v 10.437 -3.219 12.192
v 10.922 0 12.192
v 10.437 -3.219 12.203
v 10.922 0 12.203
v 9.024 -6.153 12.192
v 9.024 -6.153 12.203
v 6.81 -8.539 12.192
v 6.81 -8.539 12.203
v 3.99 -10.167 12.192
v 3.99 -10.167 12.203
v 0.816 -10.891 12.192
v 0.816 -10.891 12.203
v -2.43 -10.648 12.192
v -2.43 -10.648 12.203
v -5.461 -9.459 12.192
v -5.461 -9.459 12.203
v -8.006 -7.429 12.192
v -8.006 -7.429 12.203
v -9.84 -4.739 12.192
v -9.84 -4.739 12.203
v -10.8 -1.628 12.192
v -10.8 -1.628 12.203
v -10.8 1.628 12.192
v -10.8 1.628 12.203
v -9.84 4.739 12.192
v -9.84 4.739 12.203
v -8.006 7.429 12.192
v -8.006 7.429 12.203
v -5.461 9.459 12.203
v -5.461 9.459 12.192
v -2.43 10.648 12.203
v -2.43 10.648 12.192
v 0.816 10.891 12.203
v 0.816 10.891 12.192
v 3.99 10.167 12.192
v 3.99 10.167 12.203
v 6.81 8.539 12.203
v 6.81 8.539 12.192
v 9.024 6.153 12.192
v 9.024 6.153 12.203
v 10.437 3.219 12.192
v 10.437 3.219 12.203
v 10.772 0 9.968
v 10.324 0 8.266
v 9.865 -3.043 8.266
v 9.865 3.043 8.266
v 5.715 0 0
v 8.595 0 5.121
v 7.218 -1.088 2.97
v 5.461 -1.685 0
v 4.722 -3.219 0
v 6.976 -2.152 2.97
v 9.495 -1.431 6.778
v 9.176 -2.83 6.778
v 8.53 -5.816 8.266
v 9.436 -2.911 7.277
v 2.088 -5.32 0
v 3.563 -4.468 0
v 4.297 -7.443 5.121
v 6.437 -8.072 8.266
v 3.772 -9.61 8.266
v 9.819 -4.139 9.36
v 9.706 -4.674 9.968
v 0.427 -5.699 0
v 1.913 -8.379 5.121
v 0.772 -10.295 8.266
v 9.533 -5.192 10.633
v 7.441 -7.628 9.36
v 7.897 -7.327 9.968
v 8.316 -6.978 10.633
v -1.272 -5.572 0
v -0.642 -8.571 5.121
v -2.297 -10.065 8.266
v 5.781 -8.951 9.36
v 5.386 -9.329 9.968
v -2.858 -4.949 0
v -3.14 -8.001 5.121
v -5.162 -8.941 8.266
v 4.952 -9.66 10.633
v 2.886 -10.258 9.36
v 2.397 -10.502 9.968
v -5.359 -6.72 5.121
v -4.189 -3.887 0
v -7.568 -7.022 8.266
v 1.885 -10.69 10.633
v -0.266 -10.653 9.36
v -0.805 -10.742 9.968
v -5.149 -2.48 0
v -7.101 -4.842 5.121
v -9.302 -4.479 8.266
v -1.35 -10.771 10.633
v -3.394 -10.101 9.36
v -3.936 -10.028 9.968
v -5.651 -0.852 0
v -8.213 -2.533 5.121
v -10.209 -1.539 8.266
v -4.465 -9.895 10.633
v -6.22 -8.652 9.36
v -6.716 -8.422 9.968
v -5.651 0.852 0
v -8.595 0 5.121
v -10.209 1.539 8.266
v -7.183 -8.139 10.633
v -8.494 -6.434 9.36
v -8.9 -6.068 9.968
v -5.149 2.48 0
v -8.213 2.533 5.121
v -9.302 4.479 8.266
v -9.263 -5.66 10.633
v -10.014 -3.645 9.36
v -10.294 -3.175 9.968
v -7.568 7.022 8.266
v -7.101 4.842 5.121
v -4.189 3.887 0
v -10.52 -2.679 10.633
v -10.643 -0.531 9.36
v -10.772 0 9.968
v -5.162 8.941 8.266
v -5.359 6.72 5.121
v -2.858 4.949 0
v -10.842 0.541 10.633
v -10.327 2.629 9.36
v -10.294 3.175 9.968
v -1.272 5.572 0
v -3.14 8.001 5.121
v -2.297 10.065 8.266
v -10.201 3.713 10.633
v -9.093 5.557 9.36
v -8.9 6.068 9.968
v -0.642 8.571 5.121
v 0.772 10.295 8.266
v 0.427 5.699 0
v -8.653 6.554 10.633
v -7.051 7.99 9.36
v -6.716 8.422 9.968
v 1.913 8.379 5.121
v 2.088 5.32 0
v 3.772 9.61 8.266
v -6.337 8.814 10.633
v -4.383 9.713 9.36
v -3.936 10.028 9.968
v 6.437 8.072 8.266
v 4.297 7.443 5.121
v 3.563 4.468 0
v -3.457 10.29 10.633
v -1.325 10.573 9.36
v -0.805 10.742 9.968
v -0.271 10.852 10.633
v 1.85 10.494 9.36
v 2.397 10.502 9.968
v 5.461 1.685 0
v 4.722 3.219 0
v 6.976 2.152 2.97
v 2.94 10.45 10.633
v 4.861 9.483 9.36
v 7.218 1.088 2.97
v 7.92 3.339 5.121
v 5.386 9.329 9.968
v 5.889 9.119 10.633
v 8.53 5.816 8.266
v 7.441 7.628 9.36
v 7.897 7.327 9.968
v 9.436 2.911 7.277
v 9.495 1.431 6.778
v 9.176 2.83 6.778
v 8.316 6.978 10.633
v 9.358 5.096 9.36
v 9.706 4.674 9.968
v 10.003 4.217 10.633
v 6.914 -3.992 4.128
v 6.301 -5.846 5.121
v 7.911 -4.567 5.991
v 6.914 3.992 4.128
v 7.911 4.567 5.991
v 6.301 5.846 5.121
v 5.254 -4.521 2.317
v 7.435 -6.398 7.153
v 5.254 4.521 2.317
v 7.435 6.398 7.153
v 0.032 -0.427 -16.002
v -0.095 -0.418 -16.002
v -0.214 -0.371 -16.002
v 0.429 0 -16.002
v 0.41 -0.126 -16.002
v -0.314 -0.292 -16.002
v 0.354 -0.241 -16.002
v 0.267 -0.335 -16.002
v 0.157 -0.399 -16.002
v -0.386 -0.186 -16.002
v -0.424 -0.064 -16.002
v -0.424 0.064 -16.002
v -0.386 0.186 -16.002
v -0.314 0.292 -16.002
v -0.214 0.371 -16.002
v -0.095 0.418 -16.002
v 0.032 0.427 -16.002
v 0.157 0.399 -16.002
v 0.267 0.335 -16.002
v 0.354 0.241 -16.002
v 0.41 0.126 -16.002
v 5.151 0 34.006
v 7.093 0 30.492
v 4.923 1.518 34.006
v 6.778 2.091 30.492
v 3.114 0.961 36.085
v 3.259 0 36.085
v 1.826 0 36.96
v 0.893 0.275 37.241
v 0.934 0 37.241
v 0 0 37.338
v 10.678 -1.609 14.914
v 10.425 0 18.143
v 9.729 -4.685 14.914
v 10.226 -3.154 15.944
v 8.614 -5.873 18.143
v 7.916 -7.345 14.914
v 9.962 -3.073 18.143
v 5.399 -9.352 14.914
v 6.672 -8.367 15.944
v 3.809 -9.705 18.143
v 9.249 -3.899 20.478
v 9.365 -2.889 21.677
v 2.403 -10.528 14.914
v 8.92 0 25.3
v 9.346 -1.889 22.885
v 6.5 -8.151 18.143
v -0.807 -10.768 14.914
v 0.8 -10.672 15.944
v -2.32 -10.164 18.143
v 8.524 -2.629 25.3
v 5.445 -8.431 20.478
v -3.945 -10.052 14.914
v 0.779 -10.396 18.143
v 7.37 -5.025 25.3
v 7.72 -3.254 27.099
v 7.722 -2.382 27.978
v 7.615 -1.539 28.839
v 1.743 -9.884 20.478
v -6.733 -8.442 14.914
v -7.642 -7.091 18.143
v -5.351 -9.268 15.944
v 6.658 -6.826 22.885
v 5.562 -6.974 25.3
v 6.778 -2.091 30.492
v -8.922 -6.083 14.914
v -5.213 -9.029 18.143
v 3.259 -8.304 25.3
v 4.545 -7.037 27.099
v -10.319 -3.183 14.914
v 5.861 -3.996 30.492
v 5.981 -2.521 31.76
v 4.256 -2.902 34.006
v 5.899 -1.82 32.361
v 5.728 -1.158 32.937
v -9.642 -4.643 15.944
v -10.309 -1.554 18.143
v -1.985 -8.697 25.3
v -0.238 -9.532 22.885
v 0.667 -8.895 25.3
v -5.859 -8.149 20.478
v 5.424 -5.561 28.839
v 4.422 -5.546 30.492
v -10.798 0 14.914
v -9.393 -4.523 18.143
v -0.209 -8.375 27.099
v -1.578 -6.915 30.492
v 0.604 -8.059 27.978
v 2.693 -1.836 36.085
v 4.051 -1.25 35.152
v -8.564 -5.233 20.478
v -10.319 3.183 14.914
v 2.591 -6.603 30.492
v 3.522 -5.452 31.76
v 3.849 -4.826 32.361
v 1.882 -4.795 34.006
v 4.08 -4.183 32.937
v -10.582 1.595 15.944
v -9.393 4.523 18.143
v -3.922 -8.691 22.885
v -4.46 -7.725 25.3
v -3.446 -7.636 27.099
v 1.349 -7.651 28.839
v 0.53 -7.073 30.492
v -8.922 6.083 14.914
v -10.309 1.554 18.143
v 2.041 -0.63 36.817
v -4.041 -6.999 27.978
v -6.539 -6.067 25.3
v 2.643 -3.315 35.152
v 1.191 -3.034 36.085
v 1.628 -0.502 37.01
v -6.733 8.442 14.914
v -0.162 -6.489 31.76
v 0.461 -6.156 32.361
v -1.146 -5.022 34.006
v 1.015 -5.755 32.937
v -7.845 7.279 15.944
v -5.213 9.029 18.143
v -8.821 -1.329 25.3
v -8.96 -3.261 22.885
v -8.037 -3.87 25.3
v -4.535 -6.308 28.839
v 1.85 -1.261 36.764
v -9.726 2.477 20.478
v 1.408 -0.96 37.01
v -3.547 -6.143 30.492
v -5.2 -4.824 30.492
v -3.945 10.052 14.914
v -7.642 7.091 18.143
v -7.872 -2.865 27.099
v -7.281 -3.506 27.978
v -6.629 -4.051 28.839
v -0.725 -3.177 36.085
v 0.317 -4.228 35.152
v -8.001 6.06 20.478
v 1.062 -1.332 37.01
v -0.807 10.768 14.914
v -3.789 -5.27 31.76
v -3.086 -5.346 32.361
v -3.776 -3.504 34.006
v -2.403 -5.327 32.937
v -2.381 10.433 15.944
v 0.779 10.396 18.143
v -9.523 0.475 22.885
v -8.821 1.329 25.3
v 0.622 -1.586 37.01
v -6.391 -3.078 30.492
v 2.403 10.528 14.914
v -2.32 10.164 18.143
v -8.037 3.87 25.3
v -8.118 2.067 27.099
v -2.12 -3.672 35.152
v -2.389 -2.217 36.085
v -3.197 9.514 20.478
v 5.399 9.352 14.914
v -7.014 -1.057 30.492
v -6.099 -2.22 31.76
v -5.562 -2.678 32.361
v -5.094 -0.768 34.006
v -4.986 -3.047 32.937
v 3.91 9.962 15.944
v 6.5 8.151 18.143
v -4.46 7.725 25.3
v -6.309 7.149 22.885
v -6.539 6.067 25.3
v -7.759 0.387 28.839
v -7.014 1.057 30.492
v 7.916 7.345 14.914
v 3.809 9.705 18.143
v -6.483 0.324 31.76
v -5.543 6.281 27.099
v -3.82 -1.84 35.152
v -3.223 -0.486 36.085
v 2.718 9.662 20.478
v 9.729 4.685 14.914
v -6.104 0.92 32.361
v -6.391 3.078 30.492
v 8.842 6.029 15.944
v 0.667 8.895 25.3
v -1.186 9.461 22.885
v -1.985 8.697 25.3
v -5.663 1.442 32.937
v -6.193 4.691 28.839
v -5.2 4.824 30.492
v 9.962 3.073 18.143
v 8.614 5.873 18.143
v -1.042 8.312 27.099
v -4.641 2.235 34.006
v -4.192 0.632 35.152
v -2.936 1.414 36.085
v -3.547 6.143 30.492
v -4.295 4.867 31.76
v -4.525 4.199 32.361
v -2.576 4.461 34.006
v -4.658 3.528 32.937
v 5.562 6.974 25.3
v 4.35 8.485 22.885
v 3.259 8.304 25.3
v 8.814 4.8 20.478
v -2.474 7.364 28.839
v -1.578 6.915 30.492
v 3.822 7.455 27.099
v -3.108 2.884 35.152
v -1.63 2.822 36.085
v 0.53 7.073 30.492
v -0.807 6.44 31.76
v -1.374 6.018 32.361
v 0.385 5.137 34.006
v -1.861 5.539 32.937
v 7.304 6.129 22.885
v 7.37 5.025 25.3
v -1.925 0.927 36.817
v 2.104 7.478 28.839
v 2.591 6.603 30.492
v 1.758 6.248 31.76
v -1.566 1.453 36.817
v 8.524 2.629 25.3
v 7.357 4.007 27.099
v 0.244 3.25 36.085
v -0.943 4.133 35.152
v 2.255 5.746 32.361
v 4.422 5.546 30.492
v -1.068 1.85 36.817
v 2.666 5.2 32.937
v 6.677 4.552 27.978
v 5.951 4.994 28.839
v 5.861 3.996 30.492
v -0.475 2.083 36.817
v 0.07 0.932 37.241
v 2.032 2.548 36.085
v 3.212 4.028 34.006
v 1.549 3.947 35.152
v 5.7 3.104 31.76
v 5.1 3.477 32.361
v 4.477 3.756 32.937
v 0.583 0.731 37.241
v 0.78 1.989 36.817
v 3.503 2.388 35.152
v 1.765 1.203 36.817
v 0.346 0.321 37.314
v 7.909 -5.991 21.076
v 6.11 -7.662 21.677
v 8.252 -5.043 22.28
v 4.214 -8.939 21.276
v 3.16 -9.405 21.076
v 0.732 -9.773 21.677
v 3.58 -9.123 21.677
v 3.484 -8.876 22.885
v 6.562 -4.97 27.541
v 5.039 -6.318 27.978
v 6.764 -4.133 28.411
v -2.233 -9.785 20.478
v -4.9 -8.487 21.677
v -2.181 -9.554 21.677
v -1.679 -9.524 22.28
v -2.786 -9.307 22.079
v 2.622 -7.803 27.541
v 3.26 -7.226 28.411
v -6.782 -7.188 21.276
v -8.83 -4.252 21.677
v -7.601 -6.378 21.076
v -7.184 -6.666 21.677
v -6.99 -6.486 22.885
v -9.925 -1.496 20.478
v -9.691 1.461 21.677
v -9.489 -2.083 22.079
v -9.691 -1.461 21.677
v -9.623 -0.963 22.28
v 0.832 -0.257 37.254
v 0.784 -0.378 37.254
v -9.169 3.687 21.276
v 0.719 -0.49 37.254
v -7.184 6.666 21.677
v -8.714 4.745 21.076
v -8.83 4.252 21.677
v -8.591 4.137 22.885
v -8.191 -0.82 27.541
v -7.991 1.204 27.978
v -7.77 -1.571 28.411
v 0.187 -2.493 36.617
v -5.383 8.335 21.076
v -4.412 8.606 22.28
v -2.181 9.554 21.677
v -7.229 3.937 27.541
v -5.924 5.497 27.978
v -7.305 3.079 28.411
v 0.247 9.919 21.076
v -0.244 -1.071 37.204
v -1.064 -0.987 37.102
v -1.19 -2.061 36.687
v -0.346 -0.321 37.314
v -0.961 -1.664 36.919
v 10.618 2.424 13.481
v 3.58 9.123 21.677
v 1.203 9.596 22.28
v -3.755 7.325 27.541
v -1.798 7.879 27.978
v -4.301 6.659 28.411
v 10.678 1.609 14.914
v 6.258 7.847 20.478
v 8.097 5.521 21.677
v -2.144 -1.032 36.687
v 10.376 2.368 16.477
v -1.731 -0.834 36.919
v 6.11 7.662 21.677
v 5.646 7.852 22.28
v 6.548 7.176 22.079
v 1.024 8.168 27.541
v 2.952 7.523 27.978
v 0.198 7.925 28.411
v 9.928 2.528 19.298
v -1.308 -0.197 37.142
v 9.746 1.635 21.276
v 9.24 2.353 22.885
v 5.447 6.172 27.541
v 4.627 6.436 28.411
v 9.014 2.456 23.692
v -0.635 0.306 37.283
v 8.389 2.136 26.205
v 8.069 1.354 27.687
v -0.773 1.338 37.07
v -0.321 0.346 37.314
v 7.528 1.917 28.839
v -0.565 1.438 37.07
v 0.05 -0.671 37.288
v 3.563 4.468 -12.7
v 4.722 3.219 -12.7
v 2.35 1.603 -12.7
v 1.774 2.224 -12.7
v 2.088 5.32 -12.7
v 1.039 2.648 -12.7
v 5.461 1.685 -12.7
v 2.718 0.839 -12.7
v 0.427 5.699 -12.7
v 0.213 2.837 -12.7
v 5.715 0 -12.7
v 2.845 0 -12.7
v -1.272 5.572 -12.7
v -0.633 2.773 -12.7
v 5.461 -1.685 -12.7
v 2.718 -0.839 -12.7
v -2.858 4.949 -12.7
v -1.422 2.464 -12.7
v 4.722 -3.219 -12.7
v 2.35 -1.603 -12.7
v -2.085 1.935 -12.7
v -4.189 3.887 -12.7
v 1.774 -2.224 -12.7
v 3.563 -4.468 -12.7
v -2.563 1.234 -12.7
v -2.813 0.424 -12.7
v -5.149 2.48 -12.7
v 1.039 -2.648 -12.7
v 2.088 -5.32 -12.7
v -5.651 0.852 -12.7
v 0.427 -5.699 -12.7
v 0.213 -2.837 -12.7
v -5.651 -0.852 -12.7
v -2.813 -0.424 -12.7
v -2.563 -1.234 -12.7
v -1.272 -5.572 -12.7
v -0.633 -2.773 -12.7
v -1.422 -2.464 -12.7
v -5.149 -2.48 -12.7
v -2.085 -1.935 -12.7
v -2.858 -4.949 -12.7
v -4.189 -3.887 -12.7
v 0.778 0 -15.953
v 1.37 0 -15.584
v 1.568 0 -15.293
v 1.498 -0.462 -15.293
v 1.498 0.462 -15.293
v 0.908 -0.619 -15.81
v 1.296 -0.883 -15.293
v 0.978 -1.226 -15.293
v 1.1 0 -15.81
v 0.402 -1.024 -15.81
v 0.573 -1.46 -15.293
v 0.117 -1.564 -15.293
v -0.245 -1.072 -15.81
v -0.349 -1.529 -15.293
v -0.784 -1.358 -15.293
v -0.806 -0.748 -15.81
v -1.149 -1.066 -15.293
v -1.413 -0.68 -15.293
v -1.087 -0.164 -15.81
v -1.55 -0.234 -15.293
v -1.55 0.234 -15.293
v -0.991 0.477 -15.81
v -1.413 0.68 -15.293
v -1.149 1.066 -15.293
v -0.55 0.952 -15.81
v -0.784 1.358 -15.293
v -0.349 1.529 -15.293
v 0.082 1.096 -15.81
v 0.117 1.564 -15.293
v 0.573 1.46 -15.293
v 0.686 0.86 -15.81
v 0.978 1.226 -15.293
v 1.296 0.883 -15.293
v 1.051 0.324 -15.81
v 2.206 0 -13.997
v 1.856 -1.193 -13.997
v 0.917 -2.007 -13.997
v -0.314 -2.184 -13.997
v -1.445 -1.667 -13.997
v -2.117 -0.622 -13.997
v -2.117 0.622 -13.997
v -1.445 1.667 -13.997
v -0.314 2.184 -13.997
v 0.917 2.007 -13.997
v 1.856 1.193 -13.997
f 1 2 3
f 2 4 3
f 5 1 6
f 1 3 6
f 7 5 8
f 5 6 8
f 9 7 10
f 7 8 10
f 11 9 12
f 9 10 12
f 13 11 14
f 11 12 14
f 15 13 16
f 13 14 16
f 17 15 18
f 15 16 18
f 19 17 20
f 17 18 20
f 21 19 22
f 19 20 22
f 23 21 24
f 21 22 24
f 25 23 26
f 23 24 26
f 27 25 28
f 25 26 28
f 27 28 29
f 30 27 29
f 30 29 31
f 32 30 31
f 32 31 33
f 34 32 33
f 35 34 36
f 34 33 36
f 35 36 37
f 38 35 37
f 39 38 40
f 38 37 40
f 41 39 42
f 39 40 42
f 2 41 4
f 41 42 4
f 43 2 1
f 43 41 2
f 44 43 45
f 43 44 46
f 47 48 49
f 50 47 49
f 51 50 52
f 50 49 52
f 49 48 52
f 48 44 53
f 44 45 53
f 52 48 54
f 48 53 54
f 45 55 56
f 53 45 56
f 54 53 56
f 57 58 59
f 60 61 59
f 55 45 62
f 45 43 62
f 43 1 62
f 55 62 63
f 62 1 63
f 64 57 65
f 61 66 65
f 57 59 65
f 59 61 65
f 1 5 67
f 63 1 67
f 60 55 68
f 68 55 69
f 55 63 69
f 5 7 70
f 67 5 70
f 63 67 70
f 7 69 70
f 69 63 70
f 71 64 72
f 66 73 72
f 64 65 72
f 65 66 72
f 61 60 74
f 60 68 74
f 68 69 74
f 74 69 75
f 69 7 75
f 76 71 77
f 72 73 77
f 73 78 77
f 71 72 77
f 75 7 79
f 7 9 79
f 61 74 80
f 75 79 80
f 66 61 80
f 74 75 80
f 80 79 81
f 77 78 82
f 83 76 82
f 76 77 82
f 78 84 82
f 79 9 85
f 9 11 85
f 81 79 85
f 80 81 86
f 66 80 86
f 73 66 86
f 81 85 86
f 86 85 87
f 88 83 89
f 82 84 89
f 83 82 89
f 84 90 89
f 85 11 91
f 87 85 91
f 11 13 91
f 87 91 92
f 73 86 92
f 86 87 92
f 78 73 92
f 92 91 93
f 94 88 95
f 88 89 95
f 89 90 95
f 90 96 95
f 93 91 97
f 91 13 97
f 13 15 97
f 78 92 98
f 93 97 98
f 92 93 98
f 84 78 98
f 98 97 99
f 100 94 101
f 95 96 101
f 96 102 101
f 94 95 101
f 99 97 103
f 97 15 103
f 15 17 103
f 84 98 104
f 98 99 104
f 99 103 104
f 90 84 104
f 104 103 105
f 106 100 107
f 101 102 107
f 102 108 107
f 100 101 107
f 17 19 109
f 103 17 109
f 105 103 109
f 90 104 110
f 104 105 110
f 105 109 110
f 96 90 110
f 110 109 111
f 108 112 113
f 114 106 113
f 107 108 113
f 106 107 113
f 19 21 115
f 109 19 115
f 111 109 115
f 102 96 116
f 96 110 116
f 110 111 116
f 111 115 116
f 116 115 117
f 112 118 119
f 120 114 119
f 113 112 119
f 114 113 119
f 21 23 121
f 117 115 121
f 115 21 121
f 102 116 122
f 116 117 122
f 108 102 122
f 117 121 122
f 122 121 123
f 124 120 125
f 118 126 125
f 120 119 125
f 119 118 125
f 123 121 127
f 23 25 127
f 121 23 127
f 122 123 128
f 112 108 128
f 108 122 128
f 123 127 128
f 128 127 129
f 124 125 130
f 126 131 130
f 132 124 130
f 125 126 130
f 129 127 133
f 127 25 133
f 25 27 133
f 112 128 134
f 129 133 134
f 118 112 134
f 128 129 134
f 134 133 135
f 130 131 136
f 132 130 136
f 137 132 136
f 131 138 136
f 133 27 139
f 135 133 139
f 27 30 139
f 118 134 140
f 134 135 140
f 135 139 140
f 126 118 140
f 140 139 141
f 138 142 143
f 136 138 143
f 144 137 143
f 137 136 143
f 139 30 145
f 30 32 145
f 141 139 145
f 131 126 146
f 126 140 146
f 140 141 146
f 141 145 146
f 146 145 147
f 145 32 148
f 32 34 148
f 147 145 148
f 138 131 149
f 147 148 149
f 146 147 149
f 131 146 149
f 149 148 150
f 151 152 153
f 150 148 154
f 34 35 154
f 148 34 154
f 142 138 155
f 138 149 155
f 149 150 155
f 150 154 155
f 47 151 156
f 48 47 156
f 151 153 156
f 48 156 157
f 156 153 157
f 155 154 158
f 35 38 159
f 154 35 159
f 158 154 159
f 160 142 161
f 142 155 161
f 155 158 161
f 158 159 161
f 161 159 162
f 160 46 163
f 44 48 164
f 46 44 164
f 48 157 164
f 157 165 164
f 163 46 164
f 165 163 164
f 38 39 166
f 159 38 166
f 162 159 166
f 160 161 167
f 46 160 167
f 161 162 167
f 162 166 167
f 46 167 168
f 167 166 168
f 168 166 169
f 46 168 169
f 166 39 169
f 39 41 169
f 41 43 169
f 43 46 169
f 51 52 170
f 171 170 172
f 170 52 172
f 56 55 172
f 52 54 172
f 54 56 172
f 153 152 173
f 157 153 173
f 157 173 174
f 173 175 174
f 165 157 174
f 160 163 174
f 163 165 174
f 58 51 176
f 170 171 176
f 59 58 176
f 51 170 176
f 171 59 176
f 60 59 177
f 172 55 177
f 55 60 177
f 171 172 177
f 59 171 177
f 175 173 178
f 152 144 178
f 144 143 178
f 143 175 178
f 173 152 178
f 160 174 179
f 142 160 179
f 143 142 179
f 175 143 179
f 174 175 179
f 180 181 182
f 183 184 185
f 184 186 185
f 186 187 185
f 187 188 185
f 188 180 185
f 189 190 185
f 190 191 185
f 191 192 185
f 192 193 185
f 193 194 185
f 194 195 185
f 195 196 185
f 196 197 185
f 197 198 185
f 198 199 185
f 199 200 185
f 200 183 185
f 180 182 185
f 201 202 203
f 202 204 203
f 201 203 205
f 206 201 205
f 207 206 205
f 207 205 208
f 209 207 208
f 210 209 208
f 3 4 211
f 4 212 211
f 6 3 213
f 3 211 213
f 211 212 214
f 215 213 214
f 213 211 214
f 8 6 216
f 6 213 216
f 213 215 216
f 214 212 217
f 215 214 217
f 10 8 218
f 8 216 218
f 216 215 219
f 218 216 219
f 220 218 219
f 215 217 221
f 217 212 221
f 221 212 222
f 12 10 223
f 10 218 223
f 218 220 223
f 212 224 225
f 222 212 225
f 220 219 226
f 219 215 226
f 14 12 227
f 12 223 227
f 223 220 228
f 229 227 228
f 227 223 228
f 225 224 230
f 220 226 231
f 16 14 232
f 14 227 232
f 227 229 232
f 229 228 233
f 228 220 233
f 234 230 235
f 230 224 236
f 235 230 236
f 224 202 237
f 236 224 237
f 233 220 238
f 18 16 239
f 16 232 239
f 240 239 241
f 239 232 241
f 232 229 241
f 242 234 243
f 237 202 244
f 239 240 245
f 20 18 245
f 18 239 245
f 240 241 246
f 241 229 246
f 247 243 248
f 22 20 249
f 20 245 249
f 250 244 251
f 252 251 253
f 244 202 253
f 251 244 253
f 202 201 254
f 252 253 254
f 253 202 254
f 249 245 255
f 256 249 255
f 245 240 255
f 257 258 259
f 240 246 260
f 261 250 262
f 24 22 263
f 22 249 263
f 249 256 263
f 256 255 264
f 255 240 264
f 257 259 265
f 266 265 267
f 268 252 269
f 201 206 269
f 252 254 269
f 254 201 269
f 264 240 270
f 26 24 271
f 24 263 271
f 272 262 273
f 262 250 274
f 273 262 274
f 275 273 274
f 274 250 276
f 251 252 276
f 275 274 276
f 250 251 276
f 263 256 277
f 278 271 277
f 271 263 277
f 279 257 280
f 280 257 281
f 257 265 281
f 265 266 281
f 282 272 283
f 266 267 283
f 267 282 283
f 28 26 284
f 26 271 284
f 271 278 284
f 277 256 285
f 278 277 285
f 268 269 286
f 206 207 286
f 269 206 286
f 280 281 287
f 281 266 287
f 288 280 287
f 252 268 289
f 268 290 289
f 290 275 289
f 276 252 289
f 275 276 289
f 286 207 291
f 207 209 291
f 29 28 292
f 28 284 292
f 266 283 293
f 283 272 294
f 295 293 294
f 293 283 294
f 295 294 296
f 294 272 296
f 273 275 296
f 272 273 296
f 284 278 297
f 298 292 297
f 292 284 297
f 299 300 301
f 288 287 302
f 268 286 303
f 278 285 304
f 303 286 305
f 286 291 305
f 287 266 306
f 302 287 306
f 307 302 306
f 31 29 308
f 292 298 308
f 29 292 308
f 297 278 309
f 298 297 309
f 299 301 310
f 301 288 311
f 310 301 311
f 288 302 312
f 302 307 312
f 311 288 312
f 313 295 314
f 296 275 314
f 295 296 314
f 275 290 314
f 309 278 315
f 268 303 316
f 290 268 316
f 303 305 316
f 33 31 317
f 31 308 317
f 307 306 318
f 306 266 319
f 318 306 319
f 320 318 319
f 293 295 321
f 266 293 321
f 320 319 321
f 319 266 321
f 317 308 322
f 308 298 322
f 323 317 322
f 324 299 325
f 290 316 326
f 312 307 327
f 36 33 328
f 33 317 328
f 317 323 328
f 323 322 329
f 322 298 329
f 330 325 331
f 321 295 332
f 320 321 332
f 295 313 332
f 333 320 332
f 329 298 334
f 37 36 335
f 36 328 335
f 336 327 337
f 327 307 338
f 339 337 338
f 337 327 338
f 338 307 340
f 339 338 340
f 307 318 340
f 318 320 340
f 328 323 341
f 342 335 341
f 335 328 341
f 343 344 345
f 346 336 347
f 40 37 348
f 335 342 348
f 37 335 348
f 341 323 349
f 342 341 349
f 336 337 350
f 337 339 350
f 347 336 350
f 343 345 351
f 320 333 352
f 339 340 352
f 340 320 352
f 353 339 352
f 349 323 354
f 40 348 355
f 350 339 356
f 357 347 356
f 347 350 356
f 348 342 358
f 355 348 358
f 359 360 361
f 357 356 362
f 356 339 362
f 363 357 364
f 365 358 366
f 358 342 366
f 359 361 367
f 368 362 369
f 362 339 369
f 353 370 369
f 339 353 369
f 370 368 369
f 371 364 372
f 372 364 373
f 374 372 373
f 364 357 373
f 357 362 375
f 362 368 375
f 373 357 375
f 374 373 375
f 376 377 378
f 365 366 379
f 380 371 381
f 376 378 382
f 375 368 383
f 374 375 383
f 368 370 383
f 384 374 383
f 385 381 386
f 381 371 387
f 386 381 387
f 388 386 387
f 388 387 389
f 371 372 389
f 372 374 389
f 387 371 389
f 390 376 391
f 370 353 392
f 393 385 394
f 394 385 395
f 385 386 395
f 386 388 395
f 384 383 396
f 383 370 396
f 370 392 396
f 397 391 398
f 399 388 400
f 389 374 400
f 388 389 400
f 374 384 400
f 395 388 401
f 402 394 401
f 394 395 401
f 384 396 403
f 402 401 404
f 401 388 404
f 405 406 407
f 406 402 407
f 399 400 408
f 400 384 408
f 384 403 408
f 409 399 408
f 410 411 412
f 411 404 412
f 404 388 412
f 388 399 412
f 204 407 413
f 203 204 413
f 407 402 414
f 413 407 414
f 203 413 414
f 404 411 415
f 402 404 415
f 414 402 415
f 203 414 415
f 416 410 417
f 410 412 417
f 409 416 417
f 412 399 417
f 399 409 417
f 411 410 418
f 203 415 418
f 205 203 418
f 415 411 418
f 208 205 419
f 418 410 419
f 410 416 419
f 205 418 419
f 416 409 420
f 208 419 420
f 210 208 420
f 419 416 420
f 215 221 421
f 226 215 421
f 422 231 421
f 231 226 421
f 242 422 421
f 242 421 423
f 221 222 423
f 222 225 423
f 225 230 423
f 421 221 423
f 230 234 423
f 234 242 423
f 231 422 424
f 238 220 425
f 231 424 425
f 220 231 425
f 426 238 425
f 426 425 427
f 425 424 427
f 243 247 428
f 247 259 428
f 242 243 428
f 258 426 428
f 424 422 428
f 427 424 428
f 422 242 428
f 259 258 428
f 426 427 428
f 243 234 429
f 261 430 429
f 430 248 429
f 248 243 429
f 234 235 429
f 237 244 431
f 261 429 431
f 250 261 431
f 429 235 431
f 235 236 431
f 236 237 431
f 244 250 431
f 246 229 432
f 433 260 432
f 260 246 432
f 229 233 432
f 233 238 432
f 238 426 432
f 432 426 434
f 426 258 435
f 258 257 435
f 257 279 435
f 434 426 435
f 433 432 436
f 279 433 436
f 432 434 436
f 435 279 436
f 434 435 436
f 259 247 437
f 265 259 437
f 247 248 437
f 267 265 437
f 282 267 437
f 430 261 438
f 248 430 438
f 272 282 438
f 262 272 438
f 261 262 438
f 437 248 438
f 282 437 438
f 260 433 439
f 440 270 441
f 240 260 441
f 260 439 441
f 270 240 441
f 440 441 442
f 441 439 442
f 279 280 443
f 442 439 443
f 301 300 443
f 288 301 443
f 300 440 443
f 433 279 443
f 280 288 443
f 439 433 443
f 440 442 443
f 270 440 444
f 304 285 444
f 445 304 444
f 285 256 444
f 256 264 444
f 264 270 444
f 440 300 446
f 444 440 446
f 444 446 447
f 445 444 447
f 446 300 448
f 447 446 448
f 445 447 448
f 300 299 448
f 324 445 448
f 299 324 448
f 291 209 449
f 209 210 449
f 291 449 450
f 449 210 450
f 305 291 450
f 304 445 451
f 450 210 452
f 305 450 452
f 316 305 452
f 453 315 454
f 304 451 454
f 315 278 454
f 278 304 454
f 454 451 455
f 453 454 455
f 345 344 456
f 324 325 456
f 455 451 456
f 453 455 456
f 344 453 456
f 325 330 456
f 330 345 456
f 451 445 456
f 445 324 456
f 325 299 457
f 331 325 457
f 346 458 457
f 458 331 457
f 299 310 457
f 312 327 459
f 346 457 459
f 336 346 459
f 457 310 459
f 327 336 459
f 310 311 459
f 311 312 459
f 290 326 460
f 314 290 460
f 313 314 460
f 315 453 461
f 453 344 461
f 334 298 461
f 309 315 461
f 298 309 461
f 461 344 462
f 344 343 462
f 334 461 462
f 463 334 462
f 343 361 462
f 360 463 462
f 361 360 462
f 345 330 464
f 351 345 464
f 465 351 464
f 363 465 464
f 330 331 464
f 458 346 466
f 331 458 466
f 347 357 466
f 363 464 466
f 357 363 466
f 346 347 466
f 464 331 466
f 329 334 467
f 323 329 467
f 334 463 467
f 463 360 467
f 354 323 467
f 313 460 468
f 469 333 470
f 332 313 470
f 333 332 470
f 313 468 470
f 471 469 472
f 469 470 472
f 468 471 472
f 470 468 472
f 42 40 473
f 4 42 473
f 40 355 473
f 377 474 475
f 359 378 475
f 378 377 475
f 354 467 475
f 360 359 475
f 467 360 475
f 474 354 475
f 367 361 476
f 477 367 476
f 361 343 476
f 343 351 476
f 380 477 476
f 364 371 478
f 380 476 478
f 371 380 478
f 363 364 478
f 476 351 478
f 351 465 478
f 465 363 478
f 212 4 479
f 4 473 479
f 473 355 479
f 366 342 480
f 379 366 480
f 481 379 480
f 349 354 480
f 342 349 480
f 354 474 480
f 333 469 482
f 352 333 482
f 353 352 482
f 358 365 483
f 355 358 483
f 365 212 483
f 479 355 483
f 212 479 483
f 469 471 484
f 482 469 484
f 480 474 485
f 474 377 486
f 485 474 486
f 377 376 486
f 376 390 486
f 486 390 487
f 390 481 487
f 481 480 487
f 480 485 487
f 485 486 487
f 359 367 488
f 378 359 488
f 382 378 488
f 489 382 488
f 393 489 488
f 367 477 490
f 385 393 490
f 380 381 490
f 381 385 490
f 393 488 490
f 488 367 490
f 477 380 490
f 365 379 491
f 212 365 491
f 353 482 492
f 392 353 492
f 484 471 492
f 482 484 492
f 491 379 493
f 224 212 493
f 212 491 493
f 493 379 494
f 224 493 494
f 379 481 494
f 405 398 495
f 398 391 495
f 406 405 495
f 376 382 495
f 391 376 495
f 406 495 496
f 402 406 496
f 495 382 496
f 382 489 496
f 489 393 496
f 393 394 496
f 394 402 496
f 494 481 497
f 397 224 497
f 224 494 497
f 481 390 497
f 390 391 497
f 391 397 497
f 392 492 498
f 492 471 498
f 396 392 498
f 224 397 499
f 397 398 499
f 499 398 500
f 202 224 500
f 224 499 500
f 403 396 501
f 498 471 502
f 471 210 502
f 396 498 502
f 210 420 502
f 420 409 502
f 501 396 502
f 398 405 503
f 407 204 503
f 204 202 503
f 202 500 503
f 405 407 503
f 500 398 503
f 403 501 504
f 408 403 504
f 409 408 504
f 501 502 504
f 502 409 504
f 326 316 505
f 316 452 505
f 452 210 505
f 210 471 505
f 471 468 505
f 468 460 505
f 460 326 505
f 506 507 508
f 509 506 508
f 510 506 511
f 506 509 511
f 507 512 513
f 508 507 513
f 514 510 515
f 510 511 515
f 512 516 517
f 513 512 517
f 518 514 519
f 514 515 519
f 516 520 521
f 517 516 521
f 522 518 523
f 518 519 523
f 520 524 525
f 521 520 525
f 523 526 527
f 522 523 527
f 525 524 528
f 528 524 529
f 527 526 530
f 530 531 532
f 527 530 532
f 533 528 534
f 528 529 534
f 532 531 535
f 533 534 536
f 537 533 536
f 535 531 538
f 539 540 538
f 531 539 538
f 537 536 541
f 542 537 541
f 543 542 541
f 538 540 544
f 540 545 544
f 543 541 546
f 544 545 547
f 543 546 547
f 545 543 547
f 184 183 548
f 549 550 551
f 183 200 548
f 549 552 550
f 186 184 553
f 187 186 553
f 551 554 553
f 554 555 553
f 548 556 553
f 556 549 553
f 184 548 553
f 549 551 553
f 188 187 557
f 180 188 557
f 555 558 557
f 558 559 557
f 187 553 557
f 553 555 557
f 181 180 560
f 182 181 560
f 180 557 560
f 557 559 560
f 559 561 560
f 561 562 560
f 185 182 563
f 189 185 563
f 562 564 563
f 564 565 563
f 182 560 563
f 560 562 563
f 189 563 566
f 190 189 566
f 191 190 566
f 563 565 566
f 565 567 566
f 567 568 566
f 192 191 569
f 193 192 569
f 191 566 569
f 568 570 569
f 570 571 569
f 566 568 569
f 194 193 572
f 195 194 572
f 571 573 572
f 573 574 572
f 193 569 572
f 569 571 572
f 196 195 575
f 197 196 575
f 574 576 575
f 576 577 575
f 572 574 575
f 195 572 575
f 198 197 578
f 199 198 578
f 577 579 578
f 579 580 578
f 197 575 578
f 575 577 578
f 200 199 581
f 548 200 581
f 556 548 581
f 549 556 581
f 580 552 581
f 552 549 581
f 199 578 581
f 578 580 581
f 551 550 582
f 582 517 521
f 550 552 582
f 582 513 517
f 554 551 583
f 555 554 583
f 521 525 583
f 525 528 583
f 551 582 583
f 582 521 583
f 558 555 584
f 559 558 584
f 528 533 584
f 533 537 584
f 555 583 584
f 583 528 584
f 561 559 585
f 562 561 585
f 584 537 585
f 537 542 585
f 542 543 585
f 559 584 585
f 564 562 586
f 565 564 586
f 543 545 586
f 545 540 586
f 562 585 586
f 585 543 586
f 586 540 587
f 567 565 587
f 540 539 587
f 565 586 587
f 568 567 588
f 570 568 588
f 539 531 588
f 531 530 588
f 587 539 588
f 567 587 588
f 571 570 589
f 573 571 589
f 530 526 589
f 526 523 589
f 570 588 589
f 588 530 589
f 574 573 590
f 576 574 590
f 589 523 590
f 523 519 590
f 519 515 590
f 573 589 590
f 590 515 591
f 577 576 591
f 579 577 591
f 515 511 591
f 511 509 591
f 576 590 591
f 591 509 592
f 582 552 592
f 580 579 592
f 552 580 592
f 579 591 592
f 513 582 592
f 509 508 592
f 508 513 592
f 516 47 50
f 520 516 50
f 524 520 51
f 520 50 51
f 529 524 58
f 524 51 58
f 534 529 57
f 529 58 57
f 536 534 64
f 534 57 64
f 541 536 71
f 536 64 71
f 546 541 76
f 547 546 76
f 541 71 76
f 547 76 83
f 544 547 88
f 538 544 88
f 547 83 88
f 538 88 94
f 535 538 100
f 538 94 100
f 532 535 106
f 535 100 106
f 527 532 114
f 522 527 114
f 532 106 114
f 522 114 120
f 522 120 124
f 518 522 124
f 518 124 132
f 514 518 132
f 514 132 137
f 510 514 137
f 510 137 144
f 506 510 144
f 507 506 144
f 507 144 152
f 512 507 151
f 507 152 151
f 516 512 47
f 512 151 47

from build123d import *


# Not quite as in the source:
# - ends of sketch curves that miss each other by under 0.0002 mm in the source are joined


with BuildPart() as f2:
    # F0 (on Front) → F2 (revolve)
    with BuildSketch(Plane.XZ):
        with BuildLine():
            Line((1.5679514959, -15.2930365572), (2.8448, -12.7))
            Line((2.8448, -12.7), (5.715, -12.7))
            Line((5.715, -12.7), (5.715, 0))
            Line((5.715, 0), (0, 0))
            Line((0, 0), (0, -16.002))
            Line((0, -16.002), (0.4285929126, -16.002))
            ThreePointArc((0.4285929126, -16.002), (1.0995562396, -15.8102894852), (1.5679514959, -15.2930365572))
        make_face()
    revolve(axis=Axis((0, 0, 12.4274427071), (0, 0, -1)))


with BuildPart() as f3_1:
    # F3: copy of F2
    add(f2.part)


with BuildPart() as f2_1:
    add(f2.part)

    # F0 (on Front) → F5 (revolve)
    with BuildSketch(Plane.XZ):
        with BuildLine():
            Line((0, 0), (5.715, 0))
            add(Edge.make_bspline(
                [(5.715, 0), (9.213257581, 7.0497766137), (10.9194947638, 7.0893163742), (10.922, 12.192)],
                knots=[0, 0, 0, 0, 0.4101662252, 0.4101662252, 0.4101662252, 0.4101662252], degree=3))
            Line((10.922, 12.192), (10.922, 12.2032626975))
            add(Edge.make_bspline(
                [(10.922, 12.2032626975), (10.9220027628, 19.5480467726), (7.4021908993, 37.338), (0, 37.338)],
                knots=[0.4104677797, 0.4104677797, 0.4104677797, 0.4104677797, 1, 1, 1, 1], degree=3))
            Line((0, 37.338), (0, 0))
        make_face()
    revolve(axis=Axis((0, 0, 12.4274427071), (0, 0, -1)))


with BuildPart() as f6_1:
    # F6: copy of F2
    add(f2_1.part)


solid = f2_1.part
